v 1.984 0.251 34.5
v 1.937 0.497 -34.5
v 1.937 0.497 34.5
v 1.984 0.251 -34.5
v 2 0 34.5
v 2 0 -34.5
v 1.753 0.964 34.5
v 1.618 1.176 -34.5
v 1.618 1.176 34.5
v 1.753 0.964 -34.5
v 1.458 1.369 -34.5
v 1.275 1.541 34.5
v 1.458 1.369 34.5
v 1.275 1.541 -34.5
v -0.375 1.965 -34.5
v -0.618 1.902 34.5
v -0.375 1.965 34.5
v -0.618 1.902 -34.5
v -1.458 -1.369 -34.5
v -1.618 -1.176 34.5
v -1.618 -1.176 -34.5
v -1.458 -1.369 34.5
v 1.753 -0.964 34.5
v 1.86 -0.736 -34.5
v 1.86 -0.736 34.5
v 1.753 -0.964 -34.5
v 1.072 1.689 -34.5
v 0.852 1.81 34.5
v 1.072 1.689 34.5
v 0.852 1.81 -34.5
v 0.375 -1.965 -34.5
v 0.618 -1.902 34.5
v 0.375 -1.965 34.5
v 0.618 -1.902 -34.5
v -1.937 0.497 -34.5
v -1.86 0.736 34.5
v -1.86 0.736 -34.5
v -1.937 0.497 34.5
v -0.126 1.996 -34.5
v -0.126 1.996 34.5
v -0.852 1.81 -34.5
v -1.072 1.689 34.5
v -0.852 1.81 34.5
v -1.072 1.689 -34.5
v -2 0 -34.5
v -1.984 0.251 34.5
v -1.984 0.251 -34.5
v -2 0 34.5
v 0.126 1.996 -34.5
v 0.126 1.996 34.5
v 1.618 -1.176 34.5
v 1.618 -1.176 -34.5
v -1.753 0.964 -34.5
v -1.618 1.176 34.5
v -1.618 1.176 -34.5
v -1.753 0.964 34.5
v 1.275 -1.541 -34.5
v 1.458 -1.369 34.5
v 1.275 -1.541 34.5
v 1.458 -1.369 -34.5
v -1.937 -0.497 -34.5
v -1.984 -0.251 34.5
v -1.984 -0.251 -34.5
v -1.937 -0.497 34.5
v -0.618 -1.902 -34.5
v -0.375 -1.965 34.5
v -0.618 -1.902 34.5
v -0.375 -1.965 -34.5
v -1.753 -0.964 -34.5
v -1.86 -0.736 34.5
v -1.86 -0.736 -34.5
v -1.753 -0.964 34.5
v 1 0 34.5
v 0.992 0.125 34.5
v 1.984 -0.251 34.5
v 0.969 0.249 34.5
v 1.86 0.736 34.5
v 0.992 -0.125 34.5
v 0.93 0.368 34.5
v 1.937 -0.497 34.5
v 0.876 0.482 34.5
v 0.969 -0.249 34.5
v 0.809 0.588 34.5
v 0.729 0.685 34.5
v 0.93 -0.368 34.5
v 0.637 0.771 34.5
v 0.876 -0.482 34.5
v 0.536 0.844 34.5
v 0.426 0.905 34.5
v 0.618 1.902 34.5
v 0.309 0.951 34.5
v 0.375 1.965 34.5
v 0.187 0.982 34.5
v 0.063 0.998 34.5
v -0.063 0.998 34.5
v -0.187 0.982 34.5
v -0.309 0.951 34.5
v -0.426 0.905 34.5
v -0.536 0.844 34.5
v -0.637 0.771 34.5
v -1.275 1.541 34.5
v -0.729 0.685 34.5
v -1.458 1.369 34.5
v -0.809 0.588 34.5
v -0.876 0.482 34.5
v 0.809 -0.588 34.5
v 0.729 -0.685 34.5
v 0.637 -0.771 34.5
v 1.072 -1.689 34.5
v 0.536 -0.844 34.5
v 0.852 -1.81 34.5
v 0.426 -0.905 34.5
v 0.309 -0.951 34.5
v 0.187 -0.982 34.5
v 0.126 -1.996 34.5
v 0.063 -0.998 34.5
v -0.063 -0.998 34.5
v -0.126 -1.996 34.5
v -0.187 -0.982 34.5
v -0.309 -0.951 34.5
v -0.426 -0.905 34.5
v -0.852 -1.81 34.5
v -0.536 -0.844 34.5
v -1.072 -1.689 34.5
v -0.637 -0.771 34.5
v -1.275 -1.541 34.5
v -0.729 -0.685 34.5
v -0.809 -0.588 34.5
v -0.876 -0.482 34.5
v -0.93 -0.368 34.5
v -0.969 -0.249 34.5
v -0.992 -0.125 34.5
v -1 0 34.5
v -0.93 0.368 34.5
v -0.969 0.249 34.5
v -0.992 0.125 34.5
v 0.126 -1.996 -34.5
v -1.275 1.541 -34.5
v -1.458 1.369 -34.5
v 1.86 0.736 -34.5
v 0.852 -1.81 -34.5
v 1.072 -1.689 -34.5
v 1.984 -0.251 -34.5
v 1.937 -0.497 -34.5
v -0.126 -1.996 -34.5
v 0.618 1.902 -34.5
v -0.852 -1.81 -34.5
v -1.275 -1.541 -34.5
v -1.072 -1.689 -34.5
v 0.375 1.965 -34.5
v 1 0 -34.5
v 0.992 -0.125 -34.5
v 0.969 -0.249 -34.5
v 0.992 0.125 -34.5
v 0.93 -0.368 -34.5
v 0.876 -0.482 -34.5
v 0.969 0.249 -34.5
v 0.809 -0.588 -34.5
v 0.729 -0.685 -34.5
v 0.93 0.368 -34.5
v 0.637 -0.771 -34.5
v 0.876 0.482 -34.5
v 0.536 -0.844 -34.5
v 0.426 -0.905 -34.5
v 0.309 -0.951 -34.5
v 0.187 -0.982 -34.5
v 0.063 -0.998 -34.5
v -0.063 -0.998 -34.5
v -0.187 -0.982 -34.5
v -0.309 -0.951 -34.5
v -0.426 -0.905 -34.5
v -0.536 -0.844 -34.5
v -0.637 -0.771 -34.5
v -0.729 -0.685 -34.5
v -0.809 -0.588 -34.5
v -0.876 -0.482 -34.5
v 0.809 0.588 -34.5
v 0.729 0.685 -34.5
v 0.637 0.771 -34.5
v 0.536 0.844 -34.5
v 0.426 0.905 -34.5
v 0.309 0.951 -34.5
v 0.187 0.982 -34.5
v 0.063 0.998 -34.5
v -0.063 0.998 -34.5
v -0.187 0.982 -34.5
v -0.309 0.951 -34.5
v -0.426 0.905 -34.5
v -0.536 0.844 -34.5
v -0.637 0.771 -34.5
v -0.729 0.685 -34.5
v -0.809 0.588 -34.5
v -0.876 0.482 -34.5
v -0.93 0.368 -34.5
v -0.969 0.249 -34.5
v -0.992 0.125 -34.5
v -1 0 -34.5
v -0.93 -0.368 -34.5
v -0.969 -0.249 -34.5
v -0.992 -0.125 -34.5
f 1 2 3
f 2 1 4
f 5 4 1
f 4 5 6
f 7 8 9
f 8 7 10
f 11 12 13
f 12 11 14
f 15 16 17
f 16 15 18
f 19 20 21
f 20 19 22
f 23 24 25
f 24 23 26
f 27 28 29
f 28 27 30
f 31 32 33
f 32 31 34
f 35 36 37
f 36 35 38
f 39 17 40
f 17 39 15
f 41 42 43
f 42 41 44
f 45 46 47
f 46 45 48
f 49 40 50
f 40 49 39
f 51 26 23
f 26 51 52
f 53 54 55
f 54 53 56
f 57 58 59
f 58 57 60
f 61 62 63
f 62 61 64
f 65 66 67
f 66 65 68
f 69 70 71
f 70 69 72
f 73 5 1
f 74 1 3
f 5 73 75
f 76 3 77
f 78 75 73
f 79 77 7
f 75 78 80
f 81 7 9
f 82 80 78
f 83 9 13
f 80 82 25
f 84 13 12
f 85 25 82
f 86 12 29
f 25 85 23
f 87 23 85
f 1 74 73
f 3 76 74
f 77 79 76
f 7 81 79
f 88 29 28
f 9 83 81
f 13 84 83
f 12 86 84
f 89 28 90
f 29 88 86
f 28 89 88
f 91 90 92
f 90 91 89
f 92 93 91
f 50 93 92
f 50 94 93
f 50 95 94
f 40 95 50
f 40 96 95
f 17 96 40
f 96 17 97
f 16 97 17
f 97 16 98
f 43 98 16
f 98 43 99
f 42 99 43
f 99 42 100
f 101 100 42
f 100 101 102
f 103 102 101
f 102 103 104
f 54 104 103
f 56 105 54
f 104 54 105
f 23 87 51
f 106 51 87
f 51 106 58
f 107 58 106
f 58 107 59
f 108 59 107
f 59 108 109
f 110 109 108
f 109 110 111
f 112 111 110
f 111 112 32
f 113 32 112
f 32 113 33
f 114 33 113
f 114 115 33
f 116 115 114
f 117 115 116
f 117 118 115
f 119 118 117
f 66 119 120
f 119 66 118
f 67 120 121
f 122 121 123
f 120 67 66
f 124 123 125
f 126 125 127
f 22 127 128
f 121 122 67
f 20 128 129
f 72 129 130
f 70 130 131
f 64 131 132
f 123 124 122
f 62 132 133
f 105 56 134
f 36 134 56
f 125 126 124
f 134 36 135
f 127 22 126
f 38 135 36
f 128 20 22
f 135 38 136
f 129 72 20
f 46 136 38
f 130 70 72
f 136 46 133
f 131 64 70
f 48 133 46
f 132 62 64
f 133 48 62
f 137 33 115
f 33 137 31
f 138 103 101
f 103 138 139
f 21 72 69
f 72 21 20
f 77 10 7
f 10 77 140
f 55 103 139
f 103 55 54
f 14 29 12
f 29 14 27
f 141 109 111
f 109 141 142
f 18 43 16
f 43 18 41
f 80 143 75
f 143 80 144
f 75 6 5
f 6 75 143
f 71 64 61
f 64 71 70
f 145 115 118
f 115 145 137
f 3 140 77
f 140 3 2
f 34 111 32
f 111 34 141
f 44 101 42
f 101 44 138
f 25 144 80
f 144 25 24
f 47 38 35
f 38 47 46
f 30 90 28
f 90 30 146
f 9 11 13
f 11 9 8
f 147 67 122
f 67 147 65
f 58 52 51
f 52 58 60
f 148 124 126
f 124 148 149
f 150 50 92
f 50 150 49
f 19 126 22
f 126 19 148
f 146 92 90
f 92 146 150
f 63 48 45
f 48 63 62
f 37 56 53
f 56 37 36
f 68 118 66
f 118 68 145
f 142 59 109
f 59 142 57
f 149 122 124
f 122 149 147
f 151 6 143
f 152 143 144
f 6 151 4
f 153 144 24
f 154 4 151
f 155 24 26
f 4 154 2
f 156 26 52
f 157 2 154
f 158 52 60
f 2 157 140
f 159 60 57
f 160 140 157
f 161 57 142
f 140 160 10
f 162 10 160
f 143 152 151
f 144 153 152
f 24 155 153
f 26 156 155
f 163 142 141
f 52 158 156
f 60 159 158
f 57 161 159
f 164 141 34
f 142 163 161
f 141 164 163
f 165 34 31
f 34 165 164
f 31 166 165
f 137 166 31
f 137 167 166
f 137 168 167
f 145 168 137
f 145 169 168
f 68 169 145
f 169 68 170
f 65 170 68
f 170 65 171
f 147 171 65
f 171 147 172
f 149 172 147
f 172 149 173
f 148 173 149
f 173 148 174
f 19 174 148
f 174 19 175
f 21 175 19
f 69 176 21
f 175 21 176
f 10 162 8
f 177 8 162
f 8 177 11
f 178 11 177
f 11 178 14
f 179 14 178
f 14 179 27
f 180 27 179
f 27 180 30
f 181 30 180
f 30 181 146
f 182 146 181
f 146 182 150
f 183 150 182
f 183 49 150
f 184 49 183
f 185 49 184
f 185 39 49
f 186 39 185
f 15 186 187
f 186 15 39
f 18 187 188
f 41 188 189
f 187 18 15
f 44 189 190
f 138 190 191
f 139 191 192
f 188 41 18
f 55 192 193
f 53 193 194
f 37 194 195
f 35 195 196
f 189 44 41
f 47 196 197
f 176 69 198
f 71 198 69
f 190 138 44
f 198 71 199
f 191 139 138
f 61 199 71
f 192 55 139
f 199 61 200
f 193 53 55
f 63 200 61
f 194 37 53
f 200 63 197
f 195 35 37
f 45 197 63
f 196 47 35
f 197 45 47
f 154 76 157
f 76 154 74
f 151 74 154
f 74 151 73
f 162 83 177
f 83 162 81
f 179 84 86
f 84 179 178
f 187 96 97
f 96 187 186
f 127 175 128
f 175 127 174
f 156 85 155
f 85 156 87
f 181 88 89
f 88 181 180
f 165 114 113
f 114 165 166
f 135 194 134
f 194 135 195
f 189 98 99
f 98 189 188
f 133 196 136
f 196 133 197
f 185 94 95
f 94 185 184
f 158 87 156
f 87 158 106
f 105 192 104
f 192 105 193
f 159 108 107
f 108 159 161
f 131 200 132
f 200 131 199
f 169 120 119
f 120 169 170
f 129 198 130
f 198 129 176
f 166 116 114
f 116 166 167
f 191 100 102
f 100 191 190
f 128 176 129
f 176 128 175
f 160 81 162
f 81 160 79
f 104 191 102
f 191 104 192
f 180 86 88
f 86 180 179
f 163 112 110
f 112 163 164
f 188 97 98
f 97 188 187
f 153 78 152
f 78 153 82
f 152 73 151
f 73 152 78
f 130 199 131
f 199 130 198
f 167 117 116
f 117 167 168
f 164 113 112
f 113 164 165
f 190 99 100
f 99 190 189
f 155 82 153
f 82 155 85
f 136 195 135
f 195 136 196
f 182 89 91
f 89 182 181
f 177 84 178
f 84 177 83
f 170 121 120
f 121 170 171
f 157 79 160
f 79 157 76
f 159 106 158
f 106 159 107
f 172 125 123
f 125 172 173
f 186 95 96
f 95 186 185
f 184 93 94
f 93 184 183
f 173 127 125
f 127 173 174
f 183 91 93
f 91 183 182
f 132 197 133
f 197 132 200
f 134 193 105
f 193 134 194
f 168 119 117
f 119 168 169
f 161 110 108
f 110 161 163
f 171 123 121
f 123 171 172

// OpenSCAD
$fn = 50;


difference() {
	union() {
		translate(v = [0, 0, -34.5000000000]) {
			cylinder(h = 69, r = 2.0000000000);
		}
	}
	union() {
		translate(v = [0, 0, -100.0000000000]) {
			cylinder(h = 200, r = 1.0000000000);
		}
	}
}
